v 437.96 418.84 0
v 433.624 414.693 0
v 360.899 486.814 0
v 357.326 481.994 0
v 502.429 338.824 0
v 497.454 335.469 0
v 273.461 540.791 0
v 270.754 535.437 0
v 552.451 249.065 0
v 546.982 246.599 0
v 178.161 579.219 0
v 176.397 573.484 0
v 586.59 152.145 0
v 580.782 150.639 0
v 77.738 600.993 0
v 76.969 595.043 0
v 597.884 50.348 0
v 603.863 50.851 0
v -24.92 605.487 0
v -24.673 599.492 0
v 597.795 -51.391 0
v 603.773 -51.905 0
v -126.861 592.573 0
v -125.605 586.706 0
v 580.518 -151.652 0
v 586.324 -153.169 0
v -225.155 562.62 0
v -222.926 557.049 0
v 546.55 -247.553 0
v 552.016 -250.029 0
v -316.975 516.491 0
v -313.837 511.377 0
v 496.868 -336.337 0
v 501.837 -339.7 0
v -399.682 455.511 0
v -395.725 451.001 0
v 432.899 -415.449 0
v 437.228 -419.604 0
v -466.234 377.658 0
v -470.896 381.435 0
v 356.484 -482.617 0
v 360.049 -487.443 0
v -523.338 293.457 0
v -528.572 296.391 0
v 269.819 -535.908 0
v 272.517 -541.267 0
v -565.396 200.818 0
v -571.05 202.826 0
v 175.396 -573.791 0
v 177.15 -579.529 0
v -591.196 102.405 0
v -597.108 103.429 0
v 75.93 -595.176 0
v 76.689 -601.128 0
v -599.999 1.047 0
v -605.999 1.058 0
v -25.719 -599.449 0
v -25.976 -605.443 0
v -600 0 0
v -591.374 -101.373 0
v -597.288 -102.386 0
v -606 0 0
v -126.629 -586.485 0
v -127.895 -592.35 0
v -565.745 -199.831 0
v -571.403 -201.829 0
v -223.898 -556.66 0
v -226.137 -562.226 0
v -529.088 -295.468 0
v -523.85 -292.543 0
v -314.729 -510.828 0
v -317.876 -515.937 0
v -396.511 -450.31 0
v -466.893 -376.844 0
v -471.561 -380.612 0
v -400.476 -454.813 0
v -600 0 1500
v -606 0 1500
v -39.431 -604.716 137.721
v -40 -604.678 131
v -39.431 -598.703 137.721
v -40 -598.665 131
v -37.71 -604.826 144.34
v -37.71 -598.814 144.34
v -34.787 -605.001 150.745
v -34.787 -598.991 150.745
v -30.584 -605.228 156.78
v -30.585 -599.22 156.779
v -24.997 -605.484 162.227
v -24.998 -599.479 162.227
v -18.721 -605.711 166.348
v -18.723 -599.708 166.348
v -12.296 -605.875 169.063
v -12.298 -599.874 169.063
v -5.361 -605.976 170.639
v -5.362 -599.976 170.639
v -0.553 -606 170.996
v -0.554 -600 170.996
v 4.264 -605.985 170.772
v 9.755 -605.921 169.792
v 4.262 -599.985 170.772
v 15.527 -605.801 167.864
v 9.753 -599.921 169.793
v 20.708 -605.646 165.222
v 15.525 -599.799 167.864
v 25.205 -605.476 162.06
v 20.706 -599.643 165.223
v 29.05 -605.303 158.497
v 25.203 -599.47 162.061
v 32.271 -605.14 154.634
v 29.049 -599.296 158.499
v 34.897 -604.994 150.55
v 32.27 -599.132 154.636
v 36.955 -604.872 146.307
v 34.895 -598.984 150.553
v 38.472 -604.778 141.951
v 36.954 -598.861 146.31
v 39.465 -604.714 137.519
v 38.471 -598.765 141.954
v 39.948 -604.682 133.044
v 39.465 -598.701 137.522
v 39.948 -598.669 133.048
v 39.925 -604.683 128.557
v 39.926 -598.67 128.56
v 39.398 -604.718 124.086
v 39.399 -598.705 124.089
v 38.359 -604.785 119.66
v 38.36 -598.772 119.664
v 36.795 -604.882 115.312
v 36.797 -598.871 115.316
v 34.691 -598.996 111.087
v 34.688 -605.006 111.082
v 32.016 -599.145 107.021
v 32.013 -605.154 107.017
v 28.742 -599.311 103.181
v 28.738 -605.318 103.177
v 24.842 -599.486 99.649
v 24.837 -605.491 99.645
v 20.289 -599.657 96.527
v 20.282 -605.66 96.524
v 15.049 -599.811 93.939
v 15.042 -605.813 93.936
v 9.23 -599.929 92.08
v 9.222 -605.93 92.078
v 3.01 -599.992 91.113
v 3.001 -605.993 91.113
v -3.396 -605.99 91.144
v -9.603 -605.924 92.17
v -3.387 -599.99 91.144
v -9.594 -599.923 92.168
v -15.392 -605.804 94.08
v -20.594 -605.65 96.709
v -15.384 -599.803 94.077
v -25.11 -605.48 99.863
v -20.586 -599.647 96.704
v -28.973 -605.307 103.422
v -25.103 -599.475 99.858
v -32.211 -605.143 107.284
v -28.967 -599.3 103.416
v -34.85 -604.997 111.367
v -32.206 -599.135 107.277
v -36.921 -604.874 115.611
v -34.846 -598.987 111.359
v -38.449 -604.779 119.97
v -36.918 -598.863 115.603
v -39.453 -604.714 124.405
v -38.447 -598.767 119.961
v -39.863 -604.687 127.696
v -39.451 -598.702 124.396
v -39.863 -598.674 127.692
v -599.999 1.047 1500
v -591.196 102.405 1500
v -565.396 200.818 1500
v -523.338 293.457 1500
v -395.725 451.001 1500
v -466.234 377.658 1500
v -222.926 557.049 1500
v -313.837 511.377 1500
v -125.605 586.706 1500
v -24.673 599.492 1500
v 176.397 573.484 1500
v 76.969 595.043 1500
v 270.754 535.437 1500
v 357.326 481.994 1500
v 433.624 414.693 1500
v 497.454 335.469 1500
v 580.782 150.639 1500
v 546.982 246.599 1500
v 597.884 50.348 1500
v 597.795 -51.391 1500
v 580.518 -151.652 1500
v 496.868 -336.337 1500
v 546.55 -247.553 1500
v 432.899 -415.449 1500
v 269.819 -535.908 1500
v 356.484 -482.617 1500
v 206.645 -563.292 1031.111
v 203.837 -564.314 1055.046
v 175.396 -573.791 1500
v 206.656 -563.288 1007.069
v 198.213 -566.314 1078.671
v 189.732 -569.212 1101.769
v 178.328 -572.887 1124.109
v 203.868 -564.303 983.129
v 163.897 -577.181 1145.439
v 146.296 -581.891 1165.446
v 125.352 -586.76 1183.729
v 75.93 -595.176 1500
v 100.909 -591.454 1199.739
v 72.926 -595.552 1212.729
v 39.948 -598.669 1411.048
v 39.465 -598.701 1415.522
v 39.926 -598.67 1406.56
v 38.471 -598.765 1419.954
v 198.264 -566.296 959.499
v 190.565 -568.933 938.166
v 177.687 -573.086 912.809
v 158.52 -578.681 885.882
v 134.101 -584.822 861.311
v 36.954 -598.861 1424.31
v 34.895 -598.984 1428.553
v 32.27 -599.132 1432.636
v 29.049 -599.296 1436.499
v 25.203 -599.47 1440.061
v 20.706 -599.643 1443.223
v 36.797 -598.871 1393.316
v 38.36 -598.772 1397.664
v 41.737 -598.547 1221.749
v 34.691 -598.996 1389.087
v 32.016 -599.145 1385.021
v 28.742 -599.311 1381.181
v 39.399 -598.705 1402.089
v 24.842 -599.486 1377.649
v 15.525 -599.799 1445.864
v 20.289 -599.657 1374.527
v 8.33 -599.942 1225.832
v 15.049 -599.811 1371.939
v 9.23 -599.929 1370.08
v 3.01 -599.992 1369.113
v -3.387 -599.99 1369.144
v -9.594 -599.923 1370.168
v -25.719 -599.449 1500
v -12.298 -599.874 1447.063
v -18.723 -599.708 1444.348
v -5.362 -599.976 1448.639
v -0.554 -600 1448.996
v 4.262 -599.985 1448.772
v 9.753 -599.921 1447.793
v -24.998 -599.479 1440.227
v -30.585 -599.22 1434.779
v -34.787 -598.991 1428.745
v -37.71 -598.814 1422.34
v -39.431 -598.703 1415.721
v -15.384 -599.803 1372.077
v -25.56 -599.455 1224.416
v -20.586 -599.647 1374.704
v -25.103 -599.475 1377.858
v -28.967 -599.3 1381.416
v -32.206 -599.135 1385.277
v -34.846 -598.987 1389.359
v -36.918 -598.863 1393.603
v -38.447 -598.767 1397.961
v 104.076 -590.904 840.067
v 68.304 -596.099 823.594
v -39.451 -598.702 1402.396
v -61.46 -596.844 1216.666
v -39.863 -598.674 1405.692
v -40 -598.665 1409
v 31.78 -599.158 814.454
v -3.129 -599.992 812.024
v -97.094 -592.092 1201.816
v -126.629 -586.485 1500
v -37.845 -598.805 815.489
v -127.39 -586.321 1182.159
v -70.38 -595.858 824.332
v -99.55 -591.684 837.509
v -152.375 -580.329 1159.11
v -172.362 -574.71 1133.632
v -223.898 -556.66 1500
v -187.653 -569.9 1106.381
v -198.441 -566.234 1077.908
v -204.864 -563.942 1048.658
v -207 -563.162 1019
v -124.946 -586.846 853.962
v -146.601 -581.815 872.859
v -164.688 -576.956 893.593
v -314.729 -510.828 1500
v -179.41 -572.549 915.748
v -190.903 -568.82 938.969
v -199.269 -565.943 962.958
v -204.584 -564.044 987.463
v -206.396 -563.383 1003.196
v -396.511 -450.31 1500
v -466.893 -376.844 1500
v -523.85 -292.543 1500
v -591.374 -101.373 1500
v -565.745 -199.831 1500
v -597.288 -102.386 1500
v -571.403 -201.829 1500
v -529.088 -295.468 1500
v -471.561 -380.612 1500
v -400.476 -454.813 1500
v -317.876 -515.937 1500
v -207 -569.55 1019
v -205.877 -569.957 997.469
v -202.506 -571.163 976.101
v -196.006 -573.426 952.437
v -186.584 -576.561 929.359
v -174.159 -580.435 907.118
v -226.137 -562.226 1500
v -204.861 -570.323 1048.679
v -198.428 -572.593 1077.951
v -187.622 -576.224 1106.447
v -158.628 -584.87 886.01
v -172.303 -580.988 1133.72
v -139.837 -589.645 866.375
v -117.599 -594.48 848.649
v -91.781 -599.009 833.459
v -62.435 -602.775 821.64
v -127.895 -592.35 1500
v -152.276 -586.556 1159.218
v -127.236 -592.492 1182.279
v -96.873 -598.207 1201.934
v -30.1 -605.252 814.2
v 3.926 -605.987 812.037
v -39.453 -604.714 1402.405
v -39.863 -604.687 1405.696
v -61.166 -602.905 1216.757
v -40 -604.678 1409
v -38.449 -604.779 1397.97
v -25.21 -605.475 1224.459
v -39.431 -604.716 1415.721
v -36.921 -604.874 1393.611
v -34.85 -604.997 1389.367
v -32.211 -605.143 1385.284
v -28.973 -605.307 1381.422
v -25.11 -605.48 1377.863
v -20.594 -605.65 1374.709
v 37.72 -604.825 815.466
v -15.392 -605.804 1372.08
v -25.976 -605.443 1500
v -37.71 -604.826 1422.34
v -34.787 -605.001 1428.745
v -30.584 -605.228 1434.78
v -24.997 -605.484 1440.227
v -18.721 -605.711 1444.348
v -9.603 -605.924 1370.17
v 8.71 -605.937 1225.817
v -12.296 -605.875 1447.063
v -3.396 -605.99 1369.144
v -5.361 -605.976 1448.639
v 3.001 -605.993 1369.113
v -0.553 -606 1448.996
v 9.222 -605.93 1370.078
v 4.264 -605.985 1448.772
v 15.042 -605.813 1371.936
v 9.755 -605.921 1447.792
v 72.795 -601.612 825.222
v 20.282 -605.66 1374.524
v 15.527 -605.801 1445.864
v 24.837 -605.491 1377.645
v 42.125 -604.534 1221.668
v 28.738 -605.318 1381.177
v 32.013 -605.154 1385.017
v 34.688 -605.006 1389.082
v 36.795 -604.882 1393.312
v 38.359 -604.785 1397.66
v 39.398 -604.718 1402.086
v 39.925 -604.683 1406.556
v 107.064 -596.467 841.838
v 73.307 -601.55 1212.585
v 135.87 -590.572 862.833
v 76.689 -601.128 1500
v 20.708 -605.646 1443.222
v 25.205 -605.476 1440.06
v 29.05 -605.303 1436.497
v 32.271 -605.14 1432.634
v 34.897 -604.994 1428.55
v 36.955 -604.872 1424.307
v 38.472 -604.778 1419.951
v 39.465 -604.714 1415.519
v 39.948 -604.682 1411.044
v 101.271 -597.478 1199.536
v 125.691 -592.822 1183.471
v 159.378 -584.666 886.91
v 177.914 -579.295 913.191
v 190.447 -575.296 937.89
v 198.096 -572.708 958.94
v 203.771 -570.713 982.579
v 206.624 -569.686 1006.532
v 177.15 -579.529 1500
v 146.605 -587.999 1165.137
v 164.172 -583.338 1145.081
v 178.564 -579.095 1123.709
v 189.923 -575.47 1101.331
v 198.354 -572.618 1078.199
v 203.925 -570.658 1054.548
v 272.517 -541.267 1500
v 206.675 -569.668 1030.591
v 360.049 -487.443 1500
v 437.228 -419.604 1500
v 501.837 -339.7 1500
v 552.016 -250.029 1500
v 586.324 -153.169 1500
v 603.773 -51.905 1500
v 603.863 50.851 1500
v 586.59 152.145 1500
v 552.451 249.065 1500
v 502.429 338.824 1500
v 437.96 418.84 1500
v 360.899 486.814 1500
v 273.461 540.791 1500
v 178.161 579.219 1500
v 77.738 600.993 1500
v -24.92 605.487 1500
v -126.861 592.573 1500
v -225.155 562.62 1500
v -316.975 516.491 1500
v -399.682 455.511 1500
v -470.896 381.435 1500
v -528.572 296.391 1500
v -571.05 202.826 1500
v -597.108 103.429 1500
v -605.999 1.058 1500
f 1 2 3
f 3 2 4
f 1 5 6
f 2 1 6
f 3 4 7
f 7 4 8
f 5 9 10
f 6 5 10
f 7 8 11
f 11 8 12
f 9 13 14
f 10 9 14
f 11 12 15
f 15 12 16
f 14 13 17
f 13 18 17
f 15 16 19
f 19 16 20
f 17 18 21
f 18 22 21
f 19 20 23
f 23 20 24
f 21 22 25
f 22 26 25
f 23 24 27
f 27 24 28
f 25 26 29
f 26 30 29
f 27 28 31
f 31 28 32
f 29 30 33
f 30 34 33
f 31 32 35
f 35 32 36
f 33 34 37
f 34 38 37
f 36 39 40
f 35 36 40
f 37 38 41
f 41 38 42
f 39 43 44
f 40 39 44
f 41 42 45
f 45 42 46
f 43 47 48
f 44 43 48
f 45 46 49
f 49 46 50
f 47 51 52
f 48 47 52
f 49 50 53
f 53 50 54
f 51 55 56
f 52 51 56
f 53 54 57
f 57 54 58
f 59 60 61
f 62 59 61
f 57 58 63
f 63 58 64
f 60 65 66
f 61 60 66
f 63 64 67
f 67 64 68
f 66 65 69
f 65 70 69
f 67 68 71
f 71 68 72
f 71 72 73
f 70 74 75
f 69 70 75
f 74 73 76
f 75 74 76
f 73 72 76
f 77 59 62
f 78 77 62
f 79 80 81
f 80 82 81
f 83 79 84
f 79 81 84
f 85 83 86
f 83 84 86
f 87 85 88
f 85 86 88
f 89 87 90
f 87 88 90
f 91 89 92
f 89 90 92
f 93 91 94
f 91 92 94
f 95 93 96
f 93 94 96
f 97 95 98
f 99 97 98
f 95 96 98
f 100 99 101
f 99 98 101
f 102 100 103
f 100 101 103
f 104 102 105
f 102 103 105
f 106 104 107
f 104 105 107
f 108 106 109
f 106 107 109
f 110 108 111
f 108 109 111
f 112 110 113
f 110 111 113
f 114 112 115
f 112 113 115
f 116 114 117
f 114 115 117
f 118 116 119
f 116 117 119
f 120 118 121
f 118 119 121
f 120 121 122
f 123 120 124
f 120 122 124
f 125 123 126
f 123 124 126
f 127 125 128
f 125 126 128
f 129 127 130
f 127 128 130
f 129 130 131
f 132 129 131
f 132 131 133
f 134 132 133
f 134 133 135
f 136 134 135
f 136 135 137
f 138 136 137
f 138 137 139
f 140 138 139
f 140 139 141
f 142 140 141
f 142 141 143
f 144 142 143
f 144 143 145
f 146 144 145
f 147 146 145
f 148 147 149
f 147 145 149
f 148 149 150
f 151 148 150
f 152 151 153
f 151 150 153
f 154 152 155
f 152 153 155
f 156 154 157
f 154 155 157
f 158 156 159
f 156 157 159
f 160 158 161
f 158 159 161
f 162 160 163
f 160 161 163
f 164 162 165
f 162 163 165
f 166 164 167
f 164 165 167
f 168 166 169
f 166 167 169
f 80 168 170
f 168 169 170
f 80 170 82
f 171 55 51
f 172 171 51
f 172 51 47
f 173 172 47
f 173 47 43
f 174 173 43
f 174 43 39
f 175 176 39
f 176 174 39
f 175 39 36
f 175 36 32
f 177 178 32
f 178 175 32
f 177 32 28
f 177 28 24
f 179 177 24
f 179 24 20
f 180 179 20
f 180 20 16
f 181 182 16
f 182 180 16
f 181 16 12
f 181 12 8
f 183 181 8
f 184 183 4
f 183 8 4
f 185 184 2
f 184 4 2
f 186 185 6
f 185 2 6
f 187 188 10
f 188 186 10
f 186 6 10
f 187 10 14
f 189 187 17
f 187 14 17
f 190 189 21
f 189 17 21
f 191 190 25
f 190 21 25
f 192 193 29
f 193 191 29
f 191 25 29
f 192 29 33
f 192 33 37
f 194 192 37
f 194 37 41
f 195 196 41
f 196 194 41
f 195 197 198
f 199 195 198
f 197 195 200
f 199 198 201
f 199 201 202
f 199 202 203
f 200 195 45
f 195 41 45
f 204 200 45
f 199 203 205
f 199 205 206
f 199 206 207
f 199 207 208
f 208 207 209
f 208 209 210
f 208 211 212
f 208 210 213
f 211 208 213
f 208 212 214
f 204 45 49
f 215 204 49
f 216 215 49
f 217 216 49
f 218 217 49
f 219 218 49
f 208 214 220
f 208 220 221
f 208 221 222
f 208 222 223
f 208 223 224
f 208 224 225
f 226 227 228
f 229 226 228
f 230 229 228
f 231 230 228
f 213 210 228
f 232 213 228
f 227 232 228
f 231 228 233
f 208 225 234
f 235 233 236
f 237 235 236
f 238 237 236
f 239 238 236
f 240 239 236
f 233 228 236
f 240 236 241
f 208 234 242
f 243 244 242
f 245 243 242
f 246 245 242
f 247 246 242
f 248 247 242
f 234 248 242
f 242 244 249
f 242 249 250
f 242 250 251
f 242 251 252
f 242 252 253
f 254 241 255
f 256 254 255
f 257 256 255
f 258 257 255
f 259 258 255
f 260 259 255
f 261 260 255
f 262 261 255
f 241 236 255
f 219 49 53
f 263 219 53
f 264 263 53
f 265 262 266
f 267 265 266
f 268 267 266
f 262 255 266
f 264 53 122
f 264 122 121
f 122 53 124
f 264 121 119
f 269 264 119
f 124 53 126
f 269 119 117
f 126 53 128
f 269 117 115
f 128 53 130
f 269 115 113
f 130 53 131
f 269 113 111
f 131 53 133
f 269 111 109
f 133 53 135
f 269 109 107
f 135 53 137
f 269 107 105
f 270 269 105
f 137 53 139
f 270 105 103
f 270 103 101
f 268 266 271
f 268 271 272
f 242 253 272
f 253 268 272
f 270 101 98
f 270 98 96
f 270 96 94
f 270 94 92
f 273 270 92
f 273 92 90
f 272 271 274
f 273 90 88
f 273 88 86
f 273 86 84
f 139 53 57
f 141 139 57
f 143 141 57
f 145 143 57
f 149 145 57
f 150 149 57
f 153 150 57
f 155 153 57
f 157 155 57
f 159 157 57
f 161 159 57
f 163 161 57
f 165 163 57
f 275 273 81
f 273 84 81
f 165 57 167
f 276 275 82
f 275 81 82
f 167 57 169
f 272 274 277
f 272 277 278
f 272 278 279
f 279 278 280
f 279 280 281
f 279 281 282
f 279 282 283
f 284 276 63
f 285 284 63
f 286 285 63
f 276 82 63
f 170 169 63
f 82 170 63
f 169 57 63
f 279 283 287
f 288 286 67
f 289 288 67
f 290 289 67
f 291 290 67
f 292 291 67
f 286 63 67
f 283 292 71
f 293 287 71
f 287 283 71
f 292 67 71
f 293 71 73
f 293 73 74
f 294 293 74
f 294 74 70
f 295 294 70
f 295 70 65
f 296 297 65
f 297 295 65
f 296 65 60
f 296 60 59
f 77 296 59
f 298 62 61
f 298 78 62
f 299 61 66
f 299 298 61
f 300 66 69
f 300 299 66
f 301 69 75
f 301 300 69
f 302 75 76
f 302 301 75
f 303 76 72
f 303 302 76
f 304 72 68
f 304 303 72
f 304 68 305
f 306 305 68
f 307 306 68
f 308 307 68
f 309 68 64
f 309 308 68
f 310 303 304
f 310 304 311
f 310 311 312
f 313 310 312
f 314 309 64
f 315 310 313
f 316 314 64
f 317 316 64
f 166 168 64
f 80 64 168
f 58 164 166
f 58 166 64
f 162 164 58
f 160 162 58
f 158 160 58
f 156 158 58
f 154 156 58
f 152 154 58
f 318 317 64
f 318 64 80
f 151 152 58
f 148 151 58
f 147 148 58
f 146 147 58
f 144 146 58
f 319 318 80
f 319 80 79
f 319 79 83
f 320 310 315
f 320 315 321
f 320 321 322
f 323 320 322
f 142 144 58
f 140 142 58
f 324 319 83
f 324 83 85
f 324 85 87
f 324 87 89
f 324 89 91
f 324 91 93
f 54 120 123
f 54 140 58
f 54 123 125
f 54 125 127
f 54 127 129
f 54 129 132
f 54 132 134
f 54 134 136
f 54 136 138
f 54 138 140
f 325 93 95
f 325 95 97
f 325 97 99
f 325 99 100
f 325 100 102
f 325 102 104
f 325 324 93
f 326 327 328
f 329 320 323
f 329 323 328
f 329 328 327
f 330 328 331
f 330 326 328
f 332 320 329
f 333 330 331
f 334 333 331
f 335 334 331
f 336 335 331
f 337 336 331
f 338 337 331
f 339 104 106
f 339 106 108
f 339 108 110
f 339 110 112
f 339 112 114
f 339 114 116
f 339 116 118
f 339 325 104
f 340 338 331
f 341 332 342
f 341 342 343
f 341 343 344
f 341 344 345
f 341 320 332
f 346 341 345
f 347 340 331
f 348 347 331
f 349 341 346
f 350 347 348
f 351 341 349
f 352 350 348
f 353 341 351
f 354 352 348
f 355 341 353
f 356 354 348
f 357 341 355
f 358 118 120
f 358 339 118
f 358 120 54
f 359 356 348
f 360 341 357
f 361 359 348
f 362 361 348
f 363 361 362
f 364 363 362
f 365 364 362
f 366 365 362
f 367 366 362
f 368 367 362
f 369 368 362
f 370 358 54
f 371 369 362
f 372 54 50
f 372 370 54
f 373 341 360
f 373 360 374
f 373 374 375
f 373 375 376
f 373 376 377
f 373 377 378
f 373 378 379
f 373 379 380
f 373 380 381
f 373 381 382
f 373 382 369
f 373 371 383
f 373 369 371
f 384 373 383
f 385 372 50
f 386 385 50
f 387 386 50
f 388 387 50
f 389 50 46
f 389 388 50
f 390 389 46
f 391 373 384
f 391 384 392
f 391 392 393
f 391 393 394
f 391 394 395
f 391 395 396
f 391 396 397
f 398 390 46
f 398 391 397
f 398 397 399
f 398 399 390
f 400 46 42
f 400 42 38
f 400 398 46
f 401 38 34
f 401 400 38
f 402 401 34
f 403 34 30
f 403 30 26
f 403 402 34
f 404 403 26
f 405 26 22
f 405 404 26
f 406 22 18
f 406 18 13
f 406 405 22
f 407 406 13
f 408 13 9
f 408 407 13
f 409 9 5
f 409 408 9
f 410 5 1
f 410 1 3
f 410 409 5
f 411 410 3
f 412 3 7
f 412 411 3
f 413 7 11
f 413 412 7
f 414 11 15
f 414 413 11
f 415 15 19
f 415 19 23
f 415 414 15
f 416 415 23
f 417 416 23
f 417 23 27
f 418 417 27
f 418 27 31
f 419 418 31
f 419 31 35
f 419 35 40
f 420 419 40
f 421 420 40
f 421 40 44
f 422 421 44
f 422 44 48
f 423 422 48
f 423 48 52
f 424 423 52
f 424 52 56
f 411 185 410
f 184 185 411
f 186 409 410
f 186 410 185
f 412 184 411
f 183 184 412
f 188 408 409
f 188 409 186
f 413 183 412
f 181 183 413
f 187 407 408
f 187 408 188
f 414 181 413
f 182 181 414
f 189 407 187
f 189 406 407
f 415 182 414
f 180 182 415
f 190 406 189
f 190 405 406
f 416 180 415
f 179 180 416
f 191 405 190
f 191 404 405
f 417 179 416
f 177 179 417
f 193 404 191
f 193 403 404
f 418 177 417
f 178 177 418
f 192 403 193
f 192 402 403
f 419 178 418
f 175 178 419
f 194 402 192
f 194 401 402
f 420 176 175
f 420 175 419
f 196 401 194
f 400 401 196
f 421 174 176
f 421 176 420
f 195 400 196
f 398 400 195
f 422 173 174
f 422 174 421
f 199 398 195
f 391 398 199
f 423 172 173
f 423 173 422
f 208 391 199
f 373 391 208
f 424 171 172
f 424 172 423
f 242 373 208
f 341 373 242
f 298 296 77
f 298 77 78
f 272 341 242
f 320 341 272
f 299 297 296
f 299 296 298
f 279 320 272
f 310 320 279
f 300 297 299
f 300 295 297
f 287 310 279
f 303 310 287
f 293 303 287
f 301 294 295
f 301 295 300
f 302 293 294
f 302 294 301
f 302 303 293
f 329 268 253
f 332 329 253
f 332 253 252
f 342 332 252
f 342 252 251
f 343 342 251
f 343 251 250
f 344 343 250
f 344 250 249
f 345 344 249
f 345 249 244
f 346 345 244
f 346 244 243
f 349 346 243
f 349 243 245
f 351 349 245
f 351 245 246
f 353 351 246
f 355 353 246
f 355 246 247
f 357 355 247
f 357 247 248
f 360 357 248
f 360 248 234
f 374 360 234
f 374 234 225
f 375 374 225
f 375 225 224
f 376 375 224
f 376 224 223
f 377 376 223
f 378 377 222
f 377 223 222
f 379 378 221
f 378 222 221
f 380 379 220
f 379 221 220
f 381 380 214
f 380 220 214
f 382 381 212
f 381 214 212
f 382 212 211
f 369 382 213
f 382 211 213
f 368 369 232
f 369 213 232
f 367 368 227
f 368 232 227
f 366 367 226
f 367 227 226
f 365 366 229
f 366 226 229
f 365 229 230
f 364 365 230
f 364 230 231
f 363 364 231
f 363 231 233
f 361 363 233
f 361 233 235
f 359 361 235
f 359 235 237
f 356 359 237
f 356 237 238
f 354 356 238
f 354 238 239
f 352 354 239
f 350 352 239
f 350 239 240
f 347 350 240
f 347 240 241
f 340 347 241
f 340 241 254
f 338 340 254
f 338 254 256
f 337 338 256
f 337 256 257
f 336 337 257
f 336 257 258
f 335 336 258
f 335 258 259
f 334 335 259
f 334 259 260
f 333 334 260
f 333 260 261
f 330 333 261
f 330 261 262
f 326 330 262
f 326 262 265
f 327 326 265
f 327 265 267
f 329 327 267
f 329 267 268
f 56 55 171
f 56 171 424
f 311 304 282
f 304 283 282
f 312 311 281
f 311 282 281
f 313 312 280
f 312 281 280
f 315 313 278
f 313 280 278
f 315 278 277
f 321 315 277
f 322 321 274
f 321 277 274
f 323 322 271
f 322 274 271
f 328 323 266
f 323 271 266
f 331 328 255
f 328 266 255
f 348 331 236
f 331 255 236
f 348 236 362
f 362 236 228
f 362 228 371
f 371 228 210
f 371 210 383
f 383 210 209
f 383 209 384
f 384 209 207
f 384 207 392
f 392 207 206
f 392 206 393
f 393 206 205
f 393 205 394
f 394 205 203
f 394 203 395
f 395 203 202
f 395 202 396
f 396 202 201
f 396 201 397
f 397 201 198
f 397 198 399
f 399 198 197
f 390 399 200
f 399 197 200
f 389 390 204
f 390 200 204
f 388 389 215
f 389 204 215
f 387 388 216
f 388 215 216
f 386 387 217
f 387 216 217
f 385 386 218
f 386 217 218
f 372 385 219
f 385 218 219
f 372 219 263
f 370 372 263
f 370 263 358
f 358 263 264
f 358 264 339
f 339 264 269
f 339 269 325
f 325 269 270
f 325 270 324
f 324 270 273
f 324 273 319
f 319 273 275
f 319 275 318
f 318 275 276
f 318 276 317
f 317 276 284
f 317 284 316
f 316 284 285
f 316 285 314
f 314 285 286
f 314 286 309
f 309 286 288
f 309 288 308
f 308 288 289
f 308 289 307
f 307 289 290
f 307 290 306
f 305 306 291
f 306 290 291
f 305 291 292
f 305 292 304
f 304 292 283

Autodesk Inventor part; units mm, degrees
ref_plane "YZ Plane" through (0, 0, 0) normal (1, 0, 0) x (0, 1, 0)
ref_plane "XZ Plane" through (0, 0, 0) normal (0, 1, 0) x (-1, 0, 0)
ref_plane "XY Plane" through (0, 0, 0) normal (0, 0, 1) x (1, 0, 0)
sketch "Sketch1" plane through (0, 0, 0) normal (0, 1, 0) x (-1, 0, 0)
  line L0 (606, 1500) -> (600, 1500)
  line L1 (600, 1500) -> (600, 0)
  line L2 (600, 0) -> (606, 0)
  line L3 (606, 0) -> (606, 1500)
  line L4 (0, 0) -> (0, 1673.0415)
  point P0 (603, 0)
  dimension "d0" = 6
  dimension "d1" = 1500
  dimension "d2" = 1200
revolve "Revolution1" add sketch "Sketch1" angle 359.9 about axis through (0, 0, 0) along (0, 0, 1)
sketch "Sketch2" plane through (0, 0, 0) normal (0, 1, 0) x (-1, 0, 0)
  circle A0 centre (0, 1019) radius 207
  circle A1 centre (0, 131) radius 40
  circle A2 centre (0, 1409) radius 40
  line L0 (600, 1500) -> (-600, 1500) projected
  point P0 (0, 0)
  point P1 (599.9991, 1500)
  dimension "d4" = 414
  dimension "d5" = 80
  dimension "d6" = 80
  dimension "d7" = 131
  dimension "d8" = 91
  dimension "d9" = 481
extrude "Extrusion1" cut sketch "Sketch2" against normal through all
equation "\"d1\" = Высота_сред_части"
equation "\"d2\" = Внутр_Диам"
equation "\"d4\" = Внутр_диам_ревиз_окна"
equation "\"d5\" = Внешний_диам_трубы_подкл"
equation "\"d6\" = Внешний_диам_трубы_подкл"
equation "\"BendRadius\" = Thickness"
equation "\"BendReliefWidth\" = Thickness"
equation "\"BendReliefDepth\" = 0.5 * Thickness"
equation "\"CornerReliefSize\" = 4 * Thickness"
equation "\"MinimumRemnant\" = 2 * Thickness"
equation "\"TransitionRadius\" = BendRadius"
equation "\"JacobiRadiusSize\" = BendRadius"
equation "\"GapSize\" = Thickness"
equation "\"Высота_сред_части\" = 1500"
equation "\"Внутр_Диам\" = 1200"
equation "\"Внутр_диам_ревиз_окна\" = 414"
equation "\"Внешний_диам_трубы_подкл\" = 80"
equation "\"Thickness\" = 6"
properties part number "Стенка фильтра D1200"
